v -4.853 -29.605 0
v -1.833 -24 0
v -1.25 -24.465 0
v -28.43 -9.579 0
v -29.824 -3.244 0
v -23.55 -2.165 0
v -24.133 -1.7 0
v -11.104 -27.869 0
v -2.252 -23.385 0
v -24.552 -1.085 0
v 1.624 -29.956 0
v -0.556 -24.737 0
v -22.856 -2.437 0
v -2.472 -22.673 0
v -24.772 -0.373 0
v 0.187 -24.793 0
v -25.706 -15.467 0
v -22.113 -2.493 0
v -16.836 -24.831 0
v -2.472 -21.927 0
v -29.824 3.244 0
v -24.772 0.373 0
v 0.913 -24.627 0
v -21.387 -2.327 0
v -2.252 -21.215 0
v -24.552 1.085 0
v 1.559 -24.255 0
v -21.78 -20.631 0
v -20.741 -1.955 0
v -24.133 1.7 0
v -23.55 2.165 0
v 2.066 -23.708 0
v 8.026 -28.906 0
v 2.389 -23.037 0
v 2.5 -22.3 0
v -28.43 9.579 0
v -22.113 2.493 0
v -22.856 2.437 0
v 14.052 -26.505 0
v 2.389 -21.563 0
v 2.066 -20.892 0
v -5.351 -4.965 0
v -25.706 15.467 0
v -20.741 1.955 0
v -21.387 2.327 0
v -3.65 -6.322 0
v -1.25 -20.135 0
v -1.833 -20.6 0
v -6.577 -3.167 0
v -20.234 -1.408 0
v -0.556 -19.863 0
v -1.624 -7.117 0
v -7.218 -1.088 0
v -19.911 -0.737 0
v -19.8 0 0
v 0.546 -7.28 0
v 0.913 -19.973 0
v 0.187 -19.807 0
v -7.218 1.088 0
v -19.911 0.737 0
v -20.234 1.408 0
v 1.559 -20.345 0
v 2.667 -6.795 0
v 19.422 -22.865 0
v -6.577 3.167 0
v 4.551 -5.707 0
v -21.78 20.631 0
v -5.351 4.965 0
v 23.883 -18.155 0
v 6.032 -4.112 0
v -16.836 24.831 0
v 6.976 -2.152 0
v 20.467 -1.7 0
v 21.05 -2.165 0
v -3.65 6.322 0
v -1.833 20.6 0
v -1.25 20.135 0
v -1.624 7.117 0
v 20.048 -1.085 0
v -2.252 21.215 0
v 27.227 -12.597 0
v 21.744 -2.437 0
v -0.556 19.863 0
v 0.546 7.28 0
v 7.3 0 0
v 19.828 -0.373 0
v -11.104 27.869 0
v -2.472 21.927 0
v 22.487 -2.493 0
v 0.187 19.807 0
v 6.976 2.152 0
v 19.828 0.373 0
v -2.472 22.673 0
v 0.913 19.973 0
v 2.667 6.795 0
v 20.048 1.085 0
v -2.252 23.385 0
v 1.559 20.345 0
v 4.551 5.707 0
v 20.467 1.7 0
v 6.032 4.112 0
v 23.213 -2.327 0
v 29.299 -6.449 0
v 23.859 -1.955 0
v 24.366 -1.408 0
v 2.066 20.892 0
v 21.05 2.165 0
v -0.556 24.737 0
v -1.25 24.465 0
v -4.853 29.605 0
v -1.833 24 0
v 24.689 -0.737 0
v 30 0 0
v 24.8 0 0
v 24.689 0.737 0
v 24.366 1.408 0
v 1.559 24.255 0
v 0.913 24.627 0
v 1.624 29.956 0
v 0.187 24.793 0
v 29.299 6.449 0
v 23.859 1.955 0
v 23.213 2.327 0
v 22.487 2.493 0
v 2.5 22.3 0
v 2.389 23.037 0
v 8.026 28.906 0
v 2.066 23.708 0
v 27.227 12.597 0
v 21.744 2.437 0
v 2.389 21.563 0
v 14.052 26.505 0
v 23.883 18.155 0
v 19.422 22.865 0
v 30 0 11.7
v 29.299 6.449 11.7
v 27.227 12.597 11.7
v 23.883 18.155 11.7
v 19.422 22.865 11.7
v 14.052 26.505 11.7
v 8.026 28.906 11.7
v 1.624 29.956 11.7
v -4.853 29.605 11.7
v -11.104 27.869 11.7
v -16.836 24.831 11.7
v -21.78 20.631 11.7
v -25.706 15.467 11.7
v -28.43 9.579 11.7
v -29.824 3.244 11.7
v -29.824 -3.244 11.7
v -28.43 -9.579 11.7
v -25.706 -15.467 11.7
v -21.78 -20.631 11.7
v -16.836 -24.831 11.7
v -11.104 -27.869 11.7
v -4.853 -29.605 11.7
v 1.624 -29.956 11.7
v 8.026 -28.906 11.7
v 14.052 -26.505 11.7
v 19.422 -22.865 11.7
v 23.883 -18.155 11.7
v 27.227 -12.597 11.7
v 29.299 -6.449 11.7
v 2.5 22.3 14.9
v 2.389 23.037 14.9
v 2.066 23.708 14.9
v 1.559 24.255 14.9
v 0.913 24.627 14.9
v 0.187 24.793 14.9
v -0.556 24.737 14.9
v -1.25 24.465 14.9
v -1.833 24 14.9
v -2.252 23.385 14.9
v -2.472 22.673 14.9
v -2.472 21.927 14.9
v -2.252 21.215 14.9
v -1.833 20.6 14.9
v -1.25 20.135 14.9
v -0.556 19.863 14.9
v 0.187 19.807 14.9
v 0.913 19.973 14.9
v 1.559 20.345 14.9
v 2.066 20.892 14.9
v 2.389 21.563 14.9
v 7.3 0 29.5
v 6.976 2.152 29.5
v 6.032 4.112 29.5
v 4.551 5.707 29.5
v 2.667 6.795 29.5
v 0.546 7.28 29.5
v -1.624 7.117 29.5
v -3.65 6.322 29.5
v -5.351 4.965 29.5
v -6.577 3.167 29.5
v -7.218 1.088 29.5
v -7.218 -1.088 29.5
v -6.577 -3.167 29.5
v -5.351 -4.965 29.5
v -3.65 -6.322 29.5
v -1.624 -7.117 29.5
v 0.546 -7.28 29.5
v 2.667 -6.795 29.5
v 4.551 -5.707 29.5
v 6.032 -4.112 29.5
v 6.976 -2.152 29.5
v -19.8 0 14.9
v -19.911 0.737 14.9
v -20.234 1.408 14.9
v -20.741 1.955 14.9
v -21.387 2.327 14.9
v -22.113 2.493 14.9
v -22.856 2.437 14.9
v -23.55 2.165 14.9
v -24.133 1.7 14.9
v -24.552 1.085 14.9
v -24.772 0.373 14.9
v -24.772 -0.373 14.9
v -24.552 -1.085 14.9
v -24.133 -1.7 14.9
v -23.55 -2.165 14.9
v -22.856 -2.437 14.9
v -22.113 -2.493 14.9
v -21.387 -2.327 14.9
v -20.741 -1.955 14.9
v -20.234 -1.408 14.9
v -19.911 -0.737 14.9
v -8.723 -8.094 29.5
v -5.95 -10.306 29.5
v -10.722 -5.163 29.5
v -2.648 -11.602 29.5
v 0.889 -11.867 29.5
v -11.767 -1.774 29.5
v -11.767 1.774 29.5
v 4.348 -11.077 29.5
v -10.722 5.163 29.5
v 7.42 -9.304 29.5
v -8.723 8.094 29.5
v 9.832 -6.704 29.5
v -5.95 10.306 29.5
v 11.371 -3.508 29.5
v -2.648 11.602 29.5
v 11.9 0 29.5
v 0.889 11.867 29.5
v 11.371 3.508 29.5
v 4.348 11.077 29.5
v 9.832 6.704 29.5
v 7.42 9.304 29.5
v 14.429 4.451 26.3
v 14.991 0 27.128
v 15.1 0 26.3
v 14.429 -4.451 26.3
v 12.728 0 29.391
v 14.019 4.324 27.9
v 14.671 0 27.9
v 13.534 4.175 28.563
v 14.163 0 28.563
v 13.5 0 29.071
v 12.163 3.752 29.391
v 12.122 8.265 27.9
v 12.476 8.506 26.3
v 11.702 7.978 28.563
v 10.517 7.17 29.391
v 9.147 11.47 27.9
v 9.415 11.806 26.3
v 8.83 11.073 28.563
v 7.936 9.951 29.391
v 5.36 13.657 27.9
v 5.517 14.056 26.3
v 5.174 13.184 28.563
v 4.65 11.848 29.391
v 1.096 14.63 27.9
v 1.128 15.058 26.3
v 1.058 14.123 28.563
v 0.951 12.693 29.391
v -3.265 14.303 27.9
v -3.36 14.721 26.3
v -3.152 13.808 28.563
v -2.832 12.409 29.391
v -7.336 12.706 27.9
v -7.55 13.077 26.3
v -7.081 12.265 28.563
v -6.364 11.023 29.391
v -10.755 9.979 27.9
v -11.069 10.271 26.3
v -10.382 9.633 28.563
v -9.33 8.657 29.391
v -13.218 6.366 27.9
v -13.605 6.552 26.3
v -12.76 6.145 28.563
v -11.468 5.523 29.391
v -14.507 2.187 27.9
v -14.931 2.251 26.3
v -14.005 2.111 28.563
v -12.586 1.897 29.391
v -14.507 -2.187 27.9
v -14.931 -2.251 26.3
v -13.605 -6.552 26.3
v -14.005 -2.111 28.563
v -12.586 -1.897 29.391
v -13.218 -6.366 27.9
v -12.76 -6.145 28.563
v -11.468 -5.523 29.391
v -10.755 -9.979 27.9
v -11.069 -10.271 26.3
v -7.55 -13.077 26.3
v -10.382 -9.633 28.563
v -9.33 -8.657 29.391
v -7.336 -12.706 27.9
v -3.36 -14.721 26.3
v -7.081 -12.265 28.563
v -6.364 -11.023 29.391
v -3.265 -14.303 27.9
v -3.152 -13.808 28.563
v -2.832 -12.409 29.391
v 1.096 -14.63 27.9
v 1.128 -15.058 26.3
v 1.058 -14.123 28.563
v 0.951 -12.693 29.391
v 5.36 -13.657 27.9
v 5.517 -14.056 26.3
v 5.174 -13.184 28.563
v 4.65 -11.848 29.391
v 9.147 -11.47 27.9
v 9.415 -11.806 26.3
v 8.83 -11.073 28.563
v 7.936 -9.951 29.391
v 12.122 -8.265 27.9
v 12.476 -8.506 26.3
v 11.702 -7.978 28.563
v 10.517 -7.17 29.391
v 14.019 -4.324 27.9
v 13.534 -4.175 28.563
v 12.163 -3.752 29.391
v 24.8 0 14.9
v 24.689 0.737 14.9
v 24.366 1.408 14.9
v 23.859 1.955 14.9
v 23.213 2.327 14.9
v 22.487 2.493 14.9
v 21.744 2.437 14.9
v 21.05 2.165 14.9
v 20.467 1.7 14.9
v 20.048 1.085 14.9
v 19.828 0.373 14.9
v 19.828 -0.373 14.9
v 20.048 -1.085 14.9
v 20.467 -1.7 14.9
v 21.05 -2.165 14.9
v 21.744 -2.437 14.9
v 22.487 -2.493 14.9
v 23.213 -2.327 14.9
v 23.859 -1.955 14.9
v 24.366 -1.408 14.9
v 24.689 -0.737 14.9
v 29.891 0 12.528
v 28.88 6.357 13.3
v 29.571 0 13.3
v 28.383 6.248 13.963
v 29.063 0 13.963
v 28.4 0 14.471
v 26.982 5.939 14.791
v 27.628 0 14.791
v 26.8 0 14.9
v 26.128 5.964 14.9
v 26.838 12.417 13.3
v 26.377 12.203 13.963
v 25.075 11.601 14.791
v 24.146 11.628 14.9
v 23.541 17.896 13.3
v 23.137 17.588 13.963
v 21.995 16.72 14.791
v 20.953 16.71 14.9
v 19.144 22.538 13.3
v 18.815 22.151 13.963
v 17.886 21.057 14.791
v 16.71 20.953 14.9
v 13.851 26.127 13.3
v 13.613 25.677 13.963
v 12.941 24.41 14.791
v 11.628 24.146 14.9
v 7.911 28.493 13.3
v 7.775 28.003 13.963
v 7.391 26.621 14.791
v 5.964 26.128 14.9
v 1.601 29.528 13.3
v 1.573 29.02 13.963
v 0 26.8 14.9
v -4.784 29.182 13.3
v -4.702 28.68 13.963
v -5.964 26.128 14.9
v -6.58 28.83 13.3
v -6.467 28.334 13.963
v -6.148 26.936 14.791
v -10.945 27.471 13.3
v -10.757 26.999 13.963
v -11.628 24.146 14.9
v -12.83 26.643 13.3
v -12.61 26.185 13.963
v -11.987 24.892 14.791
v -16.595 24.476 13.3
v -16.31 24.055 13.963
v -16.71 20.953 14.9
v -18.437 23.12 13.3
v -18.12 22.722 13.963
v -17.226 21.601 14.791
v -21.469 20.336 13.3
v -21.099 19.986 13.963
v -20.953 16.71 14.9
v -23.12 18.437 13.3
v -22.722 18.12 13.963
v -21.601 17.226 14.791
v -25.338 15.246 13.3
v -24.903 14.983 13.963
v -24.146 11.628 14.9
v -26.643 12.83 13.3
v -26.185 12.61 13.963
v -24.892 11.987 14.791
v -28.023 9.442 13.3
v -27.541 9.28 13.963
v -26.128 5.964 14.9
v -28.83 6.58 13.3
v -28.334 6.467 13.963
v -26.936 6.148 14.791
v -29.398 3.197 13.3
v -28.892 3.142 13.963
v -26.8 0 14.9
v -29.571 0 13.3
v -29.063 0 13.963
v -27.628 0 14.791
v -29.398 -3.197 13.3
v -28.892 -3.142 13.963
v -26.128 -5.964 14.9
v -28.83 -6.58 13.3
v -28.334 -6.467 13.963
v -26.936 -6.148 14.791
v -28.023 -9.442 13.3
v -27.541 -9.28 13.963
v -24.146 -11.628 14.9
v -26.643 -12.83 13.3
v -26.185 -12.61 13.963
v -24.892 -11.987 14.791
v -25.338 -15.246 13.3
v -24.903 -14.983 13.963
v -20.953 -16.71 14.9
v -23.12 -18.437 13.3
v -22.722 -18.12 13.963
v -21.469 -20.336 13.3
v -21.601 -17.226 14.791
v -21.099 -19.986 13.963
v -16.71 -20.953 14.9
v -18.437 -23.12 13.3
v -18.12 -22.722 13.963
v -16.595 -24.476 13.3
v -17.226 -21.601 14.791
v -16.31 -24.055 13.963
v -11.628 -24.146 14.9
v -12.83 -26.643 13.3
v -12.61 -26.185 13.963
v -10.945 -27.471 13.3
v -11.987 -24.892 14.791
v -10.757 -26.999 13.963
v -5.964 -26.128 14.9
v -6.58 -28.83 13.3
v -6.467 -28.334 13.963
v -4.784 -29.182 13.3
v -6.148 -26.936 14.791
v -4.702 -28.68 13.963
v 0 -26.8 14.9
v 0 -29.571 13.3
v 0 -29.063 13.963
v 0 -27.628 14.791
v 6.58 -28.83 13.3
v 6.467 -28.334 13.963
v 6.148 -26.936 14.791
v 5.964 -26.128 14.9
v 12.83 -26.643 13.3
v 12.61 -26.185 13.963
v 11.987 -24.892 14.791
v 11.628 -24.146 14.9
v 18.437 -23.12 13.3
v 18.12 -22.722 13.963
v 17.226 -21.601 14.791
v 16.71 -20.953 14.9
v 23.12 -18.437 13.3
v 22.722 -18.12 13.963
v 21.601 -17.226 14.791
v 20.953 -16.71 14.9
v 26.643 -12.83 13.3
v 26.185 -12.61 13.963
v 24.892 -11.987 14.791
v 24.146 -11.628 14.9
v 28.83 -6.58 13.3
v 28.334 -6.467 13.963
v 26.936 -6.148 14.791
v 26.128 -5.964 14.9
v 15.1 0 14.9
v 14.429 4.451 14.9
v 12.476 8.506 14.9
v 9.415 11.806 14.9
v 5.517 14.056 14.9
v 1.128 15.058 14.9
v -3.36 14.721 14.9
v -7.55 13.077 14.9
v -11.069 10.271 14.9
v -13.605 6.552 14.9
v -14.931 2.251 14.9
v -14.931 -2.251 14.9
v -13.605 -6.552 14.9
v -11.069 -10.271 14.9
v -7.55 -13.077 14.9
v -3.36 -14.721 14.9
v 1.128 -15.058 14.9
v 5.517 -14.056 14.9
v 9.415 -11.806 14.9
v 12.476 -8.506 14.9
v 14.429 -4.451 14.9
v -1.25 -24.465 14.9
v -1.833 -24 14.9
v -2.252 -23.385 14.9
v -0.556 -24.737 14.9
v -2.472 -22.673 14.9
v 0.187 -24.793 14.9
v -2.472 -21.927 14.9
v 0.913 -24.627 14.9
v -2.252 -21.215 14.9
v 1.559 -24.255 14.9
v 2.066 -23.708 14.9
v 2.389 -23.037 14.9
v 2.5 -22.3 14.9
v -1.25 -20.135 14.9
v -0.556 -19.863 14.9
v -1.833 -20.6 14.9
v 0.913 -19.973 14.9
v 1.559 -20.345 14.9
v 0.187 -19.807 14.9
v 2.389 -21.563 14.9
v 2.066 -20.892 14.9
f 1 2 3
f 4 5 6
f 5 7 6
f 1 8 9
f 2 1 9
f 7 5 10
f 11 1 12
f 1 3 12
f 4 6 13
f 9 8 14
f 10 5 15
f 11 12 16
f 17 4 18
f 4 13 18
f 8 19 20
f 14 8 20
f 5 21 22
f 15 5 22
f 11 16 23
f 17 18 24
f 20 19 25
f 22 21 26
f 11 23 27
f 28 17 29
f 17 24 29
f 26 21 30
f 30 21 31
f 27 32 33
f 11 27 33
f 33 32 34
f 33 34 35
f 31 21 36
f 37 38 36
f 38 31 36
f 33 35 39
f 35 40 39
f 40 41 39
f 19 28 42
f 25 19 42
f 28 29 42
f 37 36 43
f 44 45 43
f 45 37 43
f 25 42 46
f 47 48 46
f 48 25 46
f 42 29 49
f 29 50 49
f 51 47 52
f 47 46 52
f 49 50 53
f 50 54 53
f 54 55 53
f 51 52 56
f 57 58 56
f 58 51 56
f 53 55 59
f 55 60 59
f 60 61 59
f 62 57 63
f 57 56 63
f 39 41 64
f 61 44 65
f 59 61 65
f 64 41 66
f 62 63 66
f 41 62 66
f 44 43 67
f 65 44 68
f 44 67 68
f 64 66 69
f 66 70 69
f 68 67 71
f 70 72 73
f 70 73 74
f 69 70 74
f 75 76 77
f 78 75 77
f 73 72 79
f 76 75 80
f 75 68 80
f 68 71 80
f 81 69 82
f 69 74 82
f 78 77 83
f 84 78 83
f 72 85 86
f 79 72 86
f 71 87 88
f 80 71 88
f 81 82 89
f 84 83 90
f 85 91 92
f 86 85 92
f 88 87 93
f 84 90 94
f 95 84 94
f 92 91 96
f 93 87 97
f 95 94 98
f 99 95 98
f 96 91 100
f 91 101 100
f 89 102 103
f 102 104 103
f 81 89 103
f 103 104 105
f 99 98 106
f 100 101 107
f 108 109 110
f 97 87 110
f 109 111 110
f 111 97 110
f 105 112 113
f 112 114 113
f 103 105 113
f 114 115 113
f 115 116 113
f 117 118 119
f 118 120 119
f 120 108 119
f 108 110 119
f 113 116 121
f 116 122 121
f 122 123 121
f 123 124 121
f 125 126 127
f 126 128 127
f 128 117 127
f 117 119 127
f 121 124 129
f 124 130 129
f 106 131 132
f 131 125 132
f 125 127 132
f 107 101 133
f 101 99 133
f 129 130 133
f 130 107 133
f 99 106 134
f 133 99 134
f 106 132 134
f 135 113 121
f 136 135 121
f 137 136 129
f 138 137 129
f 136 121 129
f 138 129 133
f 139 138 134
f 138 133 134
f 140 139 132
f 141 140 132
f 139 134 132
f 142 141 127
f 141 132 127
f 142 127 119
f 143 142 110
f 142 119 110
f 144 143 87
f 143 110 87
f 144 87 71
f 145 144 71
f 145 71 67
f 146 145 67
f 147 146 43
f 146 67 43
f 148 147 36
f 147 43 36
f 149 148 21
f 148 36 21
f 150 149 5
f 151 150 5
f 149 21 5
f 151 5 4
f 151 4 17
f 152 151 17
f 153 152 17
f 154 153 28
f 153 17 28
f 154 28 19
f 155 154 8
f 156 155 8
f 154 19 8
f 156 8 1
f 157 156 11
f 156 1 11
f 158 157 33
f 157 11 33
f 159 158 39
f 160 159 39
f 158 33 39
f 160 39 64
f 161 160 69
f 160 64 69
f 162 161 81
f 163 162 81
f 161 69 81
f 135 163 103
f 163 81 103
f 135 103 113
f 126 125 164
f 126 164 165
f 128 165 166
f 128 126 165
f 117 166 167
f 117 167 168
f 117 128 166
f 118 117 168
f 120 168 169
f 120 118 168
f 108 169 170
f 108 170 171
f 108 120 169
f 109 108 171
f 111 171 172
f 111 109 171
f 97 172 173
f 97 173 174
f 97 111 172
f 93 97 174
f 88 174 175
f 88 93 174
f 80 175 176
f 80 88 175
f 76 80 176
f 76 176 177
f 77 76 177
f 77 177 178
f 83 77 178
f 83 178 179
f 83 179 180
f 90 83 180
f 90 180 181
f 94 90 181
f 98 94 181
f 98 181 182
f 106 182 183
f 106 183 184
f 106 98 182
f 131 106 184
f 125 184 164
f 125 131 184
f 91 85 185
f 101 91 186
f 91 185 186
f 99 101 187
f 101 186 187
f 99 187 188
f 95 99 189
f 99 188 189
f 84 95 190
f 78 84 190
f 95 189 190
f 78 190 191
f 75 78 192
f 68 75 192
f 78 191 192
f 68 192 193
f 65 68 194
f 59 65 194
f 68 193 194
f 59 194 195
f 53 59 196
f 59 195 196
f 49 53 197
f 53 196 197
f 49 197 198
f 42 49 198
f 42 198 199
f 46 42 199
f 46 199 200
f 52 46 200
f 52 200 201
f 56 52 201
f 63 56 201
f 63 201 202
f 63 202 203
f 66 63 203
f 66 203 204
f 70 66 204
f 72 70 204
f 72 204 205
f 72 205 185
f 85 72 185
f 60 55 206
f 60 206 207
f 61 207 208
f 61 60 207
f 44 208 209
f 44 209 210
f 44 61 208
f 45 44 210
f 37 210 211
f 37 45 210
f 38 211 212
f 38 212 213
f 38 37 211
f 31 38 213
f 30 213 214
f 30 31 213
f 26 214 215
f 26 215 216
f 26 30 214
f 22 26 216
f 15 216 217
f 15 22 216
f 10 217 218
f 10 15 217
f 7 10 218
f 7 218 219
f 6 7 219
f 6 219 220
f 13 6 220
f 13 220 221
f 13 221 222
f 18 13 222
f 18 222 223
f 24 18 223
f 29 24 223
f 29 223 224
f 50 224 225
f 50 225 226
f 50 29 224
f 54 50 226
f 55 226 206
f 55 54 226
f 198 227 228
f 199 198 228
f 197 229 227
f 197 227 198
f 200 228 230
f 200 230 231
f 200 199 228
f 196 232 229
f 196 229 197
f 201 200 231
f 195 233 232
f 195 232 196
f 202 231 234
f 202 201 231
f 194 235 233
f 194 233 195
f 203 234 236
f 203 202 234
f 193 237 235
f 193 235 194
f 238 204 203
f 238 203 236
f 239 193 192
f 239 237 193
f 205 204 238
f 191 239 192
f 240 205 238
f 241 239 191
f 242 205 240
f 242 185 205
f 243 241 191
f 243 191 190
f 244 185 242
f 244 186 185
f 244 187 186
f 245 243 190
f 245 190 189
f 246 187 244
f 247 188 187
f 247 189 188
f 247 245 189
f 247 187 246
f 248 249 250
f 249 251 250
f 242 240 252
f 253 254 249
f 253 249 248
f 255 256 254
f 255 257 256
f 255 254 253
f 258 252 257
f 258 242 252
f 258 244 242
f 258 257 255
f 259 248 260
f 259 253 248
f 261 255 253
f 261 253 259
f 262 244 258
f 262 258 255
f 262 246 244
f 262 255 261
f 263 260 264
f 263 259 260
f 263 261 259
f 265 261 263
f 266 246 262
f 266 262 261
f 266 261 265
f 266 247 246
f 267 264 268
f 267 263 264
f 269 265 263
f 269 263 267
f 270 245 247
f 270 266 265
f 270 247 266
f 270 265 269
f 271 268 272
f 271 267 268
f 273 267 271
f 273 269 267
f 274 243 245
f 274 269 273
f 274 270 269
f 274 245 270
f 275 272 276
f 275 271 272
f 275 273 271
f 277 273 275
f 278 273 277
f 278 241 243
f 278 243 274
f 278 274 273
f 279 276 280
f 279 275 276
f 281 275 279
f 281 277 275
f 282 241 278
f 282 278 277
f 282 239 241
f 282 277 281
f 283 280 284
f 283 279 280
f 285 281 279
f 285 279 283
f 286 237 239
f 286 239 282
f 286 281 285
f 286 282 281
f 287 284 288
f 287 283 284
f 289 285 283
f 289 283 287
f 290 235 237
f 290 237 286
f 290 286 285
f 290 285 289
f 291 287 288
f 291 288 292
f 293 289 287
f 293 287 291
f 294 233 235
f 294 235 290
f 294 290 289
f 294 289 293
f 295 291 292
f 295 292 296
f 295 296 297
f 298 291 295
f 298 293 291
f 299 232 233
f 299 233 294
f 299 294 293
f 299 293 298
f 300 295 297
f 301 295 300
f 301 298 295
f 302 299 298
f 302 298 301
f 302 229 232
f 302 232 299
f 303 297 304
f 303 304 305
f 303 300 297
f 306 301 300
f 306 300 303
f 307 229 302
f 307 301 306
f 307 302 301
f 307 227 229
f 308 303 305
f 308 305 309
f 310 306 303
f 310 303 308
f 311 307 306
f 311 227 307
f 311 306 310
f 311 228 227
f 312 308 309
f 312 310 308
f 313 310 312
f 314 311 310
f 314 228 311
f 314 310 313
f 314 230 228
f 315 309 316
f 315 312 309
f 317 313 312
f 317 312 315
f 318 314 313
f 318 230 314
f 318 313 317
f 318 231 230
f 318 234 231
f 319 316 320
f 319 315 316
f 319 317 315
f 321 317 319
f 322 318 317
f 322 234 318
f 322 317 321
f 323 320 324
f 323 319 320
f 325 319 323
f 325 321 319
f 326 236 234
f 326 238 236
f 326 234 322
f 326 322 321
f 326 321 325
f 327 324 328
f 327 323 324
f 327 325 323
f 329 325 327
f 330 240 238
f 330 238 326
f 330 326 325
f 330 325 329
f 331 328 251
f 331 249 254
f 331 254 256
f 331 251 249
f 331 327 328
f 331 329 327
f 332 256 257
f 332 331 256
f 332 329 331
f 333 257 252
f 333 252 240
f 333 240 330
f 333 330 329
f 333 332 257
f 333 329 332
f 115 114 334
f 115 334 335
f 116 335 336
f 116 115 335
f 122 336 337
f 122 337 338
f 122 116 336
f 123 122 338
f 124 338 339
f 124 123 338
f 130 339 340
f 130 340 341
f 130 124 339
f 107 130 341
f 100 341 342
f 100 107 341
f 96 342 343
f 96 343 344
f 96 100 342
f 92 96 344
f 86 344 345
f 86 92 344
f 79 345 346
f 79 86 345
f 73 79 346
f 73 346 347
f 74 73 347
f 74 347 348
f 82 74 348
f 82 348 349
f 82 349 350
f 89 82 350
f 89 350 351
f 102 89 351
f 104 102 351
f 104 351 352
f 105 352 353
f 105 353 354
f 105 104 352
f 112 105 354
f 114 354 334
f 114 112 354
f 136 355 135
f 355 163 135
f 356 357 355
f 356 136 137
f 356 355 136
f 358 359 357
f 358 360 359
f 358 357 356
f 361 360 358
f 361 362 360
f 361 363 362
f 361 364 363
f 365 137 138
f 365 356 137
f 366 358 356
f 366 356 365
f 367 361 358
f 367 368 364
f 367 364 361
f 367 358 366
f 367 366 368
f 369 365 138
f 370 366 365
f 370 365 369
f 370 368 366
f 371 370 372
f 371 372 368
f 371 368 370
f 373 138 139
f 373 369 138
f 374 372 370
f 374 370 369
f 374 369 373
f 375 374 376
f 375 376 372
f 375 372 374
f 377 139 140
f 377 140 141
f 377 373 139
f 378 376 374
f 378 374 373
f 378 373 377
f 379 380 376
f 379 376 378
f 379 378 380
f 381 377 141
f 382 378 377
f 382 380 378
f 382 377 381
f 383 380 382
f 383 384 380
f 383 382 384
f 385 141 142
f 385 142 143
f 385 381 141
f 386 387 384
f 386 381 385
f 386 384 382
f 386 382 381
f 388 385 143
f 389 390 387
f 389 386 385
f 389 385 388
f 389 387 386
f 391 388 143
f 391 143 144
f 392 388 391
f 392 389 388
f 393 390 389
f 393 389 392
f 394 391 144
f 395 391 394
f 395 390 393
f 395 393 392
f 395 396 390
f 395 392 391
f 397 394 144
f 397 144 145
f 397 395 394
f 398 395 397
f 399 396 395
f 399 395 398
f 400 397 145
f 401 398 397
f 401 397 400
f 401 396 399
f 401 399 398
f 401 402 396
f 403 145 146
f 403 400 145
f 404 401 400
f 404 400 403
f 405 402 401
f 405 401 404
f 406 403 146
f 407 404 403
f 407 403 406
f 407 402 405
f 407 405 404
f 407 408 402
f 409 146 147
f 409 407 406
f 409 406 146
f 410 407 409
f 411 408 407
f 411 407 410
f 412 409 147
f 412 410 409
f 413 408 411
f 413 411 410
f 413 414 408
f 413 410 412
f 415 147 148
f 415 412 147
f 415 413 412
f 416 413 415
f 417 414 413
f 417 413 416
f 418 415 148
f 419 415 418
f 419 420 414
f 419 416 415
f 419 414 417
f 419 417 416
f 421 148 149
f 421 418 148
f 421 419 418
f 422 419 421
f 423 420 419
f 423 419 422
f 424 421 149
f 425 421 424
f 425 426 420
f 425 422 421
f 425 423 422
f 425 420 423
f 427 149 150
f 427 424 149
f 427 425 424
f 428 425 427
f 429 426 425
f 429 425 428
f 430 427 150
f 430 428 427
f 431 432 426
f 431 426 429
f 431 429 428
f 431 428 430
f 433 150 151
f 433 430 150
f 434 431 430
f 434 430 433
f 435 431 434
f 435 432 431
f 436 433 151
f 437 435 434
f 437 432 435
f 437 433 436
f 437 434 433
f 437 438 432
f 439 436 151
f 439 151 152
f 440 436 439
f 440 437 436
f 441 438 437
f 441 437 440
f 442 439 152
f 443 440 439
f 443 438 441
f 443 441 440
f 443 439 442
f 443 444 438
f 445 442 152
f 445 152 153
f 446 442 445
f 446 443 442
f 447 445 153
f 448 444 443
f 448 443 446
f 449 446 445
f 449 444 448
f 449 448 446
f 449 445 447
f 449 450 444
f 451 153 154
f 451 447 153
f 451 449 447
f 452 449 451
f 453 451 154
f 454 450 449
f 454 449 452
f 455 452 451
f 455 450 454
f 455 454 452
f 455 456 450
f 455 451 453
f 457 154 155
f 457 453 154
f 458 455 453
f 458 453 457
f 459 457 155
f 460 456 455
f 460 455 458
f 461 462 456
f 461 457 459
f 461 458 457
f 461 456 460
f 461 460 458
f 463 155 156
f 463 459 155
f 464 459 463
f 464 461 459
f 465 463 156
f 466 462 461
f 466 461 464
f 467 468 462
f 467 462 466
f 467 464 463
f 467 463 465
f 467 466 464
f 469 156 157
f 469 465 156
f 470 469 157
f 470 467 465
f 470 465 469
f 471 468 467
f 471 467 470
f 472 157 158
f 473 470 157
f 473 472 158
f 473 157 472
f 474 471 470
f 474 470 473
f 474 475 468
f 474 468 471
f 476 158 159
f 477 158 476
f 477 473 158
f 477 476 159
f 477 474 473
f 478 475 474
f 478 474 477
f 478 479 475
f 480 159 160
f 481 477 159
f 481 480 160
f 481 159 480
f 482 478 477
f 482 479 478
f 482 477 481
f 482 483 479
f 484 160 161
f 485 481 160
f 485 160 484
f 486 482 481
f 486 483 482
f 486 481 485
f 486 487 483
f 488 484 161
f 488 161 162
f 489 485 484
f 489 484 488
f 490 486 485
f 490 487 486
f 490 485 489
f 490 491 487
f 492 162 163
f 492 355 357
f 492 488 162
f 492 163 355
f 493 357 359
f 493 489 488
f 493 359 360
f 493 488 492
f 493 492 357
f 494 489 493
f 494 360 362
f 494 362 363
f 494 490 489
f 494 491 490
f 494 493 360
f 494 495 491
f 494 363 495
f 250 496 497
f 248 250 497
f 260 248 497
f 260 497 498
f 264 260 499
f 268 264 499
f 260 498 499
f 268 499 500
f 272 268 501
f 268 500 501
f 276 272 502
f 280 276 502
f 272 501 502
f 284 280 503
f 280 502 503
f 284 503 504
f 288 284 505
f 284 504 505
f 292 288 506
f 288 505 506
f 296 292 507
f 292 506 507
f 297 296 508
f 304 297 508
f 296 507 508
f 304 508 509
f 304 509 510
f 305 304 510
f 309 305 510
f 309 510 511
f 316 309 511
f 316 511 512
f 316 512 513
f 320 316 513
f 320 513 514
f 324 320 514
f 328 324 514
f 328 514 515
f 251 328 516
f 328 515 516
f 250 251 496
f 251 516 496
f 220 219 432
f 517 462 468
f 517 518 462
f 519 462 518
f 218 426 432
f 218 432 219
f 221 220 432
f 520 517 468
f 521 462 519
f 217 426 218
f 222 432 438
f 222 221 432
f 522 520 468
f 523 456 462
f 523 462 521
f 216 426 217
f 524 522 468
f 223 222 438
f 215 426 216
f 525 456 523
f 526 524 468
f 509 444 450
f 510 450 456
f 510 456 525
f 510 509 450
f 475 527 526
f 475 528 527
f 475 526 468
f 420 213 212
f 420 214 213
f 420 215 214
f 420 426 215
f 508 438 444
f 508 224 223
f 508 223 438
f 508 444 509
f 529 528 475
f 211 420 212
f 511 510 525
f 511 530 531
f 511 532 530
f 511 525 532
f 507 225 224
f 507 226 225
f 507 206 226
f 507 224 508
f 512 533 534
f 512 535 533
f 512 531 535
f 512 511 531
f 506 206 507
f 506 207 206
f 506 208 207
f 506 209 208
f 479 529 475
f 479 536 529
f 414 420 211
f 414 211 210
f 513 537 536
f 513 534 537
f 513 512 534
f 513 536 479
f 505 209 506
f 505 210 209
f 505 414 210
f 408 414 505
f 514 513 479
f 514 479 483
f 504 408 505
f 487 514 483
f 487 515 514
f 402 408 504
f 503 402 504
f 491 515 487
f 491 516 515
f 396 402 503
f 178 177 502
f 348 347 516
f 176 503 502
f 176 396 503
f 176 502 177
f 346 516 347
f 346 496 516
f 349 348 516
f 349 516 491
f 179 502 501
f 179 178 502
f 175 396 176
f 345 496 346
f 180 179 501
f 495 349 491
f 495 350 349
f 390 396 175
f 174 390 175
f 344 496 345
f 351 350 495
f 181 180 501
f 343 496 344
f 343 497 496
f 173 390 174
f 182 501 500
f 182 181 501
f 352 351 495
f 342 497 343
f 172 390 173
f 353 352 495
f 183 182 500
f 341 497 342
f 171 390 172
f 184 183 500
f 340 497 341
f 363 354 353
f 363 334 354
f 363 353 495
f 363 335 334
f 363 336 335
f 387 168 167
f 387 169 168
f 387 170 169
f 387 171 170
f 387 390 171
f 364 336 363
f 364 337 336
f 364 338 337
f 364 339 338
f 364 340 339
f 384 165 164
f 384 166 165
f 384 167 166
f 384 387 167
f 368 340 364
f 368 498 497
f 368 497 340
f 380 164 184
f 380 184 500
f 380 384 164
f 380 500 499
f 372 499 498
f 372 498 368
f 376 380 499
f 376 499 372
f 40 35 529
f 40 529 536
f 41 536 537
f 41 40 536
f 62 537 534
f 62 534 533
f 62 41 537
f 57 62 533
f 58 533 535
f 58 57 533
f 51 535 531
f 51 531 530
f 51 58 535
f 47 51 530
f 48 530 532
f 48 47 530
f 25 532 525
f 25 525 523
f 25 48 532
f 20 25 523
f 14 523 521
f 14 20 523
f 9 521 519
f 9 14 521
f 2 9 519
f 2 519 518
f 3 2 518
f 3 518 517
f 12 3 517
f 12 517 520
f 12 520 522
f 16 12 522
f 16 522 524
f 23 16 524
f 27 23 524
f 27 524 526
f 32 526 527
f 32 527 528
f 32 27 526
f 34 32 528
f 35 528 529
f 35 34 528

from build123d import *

# Parameters (mm, degrees)
F0_R     = 30
F0_R_2   = 2.5
F1_DEPTH = 14.9
F2_R     = 3.2
F3_R     = 15.1
F4_DEPTH = 14.6
F5_R     = 3.2
F6_R     = 7.3
F7_DEPTH = 60


with BuildPart() as f1:
    # F0 (on Top) → F1 (new body)
    with BuildSketch(Plane.XY):
        Circle(F0_R)
        with Locations((0, -22.3)):
            Circle(F0_R_2, mode=Mode.SUBTRACT)
        with Locations((-22.3, 0)):
            Circle(F0_R_2, mode=Mode.SUBTRACT)
        with Locations((22.3, 0)):
            Circle(F0_R_2, mode=Mode.SUBTRACT)
        with Locations((0, 22.3)):
            Circle(F0_R_2, mode=Mode.SUBTRACT)
    extrude(amount=F1_DEPTH)

    # F2
    f2_edges = [f1.edges().sort_by_distance(p)[0] for p in [
        (-30, 0, 14.9),
    ]]
    fillet(f2_edges, radius=F2_R)

    # F3 (on face) → F4 (join)
    with BuildSketch(Plane.XY.offset(14.9)):
        Circle(F3_R)
    extrude(amount=F4_DEPTH)

    # F5
    f5_edges = [f1.edges().sort_by_distance(p)[0] for p in [
        (-15.1, 0, 29.5),
    ]]
    fillet(f5_edges, radius=F5_R)

    # F6 (on face) → F7 (cut)
    with BuildSketch(Plane.XY.offset(29.5)):
        Circle(F6_R)
    extrude(amount=-F7_DEPTH, mode=Mode.SUBTRACT)


solid = f1.part
